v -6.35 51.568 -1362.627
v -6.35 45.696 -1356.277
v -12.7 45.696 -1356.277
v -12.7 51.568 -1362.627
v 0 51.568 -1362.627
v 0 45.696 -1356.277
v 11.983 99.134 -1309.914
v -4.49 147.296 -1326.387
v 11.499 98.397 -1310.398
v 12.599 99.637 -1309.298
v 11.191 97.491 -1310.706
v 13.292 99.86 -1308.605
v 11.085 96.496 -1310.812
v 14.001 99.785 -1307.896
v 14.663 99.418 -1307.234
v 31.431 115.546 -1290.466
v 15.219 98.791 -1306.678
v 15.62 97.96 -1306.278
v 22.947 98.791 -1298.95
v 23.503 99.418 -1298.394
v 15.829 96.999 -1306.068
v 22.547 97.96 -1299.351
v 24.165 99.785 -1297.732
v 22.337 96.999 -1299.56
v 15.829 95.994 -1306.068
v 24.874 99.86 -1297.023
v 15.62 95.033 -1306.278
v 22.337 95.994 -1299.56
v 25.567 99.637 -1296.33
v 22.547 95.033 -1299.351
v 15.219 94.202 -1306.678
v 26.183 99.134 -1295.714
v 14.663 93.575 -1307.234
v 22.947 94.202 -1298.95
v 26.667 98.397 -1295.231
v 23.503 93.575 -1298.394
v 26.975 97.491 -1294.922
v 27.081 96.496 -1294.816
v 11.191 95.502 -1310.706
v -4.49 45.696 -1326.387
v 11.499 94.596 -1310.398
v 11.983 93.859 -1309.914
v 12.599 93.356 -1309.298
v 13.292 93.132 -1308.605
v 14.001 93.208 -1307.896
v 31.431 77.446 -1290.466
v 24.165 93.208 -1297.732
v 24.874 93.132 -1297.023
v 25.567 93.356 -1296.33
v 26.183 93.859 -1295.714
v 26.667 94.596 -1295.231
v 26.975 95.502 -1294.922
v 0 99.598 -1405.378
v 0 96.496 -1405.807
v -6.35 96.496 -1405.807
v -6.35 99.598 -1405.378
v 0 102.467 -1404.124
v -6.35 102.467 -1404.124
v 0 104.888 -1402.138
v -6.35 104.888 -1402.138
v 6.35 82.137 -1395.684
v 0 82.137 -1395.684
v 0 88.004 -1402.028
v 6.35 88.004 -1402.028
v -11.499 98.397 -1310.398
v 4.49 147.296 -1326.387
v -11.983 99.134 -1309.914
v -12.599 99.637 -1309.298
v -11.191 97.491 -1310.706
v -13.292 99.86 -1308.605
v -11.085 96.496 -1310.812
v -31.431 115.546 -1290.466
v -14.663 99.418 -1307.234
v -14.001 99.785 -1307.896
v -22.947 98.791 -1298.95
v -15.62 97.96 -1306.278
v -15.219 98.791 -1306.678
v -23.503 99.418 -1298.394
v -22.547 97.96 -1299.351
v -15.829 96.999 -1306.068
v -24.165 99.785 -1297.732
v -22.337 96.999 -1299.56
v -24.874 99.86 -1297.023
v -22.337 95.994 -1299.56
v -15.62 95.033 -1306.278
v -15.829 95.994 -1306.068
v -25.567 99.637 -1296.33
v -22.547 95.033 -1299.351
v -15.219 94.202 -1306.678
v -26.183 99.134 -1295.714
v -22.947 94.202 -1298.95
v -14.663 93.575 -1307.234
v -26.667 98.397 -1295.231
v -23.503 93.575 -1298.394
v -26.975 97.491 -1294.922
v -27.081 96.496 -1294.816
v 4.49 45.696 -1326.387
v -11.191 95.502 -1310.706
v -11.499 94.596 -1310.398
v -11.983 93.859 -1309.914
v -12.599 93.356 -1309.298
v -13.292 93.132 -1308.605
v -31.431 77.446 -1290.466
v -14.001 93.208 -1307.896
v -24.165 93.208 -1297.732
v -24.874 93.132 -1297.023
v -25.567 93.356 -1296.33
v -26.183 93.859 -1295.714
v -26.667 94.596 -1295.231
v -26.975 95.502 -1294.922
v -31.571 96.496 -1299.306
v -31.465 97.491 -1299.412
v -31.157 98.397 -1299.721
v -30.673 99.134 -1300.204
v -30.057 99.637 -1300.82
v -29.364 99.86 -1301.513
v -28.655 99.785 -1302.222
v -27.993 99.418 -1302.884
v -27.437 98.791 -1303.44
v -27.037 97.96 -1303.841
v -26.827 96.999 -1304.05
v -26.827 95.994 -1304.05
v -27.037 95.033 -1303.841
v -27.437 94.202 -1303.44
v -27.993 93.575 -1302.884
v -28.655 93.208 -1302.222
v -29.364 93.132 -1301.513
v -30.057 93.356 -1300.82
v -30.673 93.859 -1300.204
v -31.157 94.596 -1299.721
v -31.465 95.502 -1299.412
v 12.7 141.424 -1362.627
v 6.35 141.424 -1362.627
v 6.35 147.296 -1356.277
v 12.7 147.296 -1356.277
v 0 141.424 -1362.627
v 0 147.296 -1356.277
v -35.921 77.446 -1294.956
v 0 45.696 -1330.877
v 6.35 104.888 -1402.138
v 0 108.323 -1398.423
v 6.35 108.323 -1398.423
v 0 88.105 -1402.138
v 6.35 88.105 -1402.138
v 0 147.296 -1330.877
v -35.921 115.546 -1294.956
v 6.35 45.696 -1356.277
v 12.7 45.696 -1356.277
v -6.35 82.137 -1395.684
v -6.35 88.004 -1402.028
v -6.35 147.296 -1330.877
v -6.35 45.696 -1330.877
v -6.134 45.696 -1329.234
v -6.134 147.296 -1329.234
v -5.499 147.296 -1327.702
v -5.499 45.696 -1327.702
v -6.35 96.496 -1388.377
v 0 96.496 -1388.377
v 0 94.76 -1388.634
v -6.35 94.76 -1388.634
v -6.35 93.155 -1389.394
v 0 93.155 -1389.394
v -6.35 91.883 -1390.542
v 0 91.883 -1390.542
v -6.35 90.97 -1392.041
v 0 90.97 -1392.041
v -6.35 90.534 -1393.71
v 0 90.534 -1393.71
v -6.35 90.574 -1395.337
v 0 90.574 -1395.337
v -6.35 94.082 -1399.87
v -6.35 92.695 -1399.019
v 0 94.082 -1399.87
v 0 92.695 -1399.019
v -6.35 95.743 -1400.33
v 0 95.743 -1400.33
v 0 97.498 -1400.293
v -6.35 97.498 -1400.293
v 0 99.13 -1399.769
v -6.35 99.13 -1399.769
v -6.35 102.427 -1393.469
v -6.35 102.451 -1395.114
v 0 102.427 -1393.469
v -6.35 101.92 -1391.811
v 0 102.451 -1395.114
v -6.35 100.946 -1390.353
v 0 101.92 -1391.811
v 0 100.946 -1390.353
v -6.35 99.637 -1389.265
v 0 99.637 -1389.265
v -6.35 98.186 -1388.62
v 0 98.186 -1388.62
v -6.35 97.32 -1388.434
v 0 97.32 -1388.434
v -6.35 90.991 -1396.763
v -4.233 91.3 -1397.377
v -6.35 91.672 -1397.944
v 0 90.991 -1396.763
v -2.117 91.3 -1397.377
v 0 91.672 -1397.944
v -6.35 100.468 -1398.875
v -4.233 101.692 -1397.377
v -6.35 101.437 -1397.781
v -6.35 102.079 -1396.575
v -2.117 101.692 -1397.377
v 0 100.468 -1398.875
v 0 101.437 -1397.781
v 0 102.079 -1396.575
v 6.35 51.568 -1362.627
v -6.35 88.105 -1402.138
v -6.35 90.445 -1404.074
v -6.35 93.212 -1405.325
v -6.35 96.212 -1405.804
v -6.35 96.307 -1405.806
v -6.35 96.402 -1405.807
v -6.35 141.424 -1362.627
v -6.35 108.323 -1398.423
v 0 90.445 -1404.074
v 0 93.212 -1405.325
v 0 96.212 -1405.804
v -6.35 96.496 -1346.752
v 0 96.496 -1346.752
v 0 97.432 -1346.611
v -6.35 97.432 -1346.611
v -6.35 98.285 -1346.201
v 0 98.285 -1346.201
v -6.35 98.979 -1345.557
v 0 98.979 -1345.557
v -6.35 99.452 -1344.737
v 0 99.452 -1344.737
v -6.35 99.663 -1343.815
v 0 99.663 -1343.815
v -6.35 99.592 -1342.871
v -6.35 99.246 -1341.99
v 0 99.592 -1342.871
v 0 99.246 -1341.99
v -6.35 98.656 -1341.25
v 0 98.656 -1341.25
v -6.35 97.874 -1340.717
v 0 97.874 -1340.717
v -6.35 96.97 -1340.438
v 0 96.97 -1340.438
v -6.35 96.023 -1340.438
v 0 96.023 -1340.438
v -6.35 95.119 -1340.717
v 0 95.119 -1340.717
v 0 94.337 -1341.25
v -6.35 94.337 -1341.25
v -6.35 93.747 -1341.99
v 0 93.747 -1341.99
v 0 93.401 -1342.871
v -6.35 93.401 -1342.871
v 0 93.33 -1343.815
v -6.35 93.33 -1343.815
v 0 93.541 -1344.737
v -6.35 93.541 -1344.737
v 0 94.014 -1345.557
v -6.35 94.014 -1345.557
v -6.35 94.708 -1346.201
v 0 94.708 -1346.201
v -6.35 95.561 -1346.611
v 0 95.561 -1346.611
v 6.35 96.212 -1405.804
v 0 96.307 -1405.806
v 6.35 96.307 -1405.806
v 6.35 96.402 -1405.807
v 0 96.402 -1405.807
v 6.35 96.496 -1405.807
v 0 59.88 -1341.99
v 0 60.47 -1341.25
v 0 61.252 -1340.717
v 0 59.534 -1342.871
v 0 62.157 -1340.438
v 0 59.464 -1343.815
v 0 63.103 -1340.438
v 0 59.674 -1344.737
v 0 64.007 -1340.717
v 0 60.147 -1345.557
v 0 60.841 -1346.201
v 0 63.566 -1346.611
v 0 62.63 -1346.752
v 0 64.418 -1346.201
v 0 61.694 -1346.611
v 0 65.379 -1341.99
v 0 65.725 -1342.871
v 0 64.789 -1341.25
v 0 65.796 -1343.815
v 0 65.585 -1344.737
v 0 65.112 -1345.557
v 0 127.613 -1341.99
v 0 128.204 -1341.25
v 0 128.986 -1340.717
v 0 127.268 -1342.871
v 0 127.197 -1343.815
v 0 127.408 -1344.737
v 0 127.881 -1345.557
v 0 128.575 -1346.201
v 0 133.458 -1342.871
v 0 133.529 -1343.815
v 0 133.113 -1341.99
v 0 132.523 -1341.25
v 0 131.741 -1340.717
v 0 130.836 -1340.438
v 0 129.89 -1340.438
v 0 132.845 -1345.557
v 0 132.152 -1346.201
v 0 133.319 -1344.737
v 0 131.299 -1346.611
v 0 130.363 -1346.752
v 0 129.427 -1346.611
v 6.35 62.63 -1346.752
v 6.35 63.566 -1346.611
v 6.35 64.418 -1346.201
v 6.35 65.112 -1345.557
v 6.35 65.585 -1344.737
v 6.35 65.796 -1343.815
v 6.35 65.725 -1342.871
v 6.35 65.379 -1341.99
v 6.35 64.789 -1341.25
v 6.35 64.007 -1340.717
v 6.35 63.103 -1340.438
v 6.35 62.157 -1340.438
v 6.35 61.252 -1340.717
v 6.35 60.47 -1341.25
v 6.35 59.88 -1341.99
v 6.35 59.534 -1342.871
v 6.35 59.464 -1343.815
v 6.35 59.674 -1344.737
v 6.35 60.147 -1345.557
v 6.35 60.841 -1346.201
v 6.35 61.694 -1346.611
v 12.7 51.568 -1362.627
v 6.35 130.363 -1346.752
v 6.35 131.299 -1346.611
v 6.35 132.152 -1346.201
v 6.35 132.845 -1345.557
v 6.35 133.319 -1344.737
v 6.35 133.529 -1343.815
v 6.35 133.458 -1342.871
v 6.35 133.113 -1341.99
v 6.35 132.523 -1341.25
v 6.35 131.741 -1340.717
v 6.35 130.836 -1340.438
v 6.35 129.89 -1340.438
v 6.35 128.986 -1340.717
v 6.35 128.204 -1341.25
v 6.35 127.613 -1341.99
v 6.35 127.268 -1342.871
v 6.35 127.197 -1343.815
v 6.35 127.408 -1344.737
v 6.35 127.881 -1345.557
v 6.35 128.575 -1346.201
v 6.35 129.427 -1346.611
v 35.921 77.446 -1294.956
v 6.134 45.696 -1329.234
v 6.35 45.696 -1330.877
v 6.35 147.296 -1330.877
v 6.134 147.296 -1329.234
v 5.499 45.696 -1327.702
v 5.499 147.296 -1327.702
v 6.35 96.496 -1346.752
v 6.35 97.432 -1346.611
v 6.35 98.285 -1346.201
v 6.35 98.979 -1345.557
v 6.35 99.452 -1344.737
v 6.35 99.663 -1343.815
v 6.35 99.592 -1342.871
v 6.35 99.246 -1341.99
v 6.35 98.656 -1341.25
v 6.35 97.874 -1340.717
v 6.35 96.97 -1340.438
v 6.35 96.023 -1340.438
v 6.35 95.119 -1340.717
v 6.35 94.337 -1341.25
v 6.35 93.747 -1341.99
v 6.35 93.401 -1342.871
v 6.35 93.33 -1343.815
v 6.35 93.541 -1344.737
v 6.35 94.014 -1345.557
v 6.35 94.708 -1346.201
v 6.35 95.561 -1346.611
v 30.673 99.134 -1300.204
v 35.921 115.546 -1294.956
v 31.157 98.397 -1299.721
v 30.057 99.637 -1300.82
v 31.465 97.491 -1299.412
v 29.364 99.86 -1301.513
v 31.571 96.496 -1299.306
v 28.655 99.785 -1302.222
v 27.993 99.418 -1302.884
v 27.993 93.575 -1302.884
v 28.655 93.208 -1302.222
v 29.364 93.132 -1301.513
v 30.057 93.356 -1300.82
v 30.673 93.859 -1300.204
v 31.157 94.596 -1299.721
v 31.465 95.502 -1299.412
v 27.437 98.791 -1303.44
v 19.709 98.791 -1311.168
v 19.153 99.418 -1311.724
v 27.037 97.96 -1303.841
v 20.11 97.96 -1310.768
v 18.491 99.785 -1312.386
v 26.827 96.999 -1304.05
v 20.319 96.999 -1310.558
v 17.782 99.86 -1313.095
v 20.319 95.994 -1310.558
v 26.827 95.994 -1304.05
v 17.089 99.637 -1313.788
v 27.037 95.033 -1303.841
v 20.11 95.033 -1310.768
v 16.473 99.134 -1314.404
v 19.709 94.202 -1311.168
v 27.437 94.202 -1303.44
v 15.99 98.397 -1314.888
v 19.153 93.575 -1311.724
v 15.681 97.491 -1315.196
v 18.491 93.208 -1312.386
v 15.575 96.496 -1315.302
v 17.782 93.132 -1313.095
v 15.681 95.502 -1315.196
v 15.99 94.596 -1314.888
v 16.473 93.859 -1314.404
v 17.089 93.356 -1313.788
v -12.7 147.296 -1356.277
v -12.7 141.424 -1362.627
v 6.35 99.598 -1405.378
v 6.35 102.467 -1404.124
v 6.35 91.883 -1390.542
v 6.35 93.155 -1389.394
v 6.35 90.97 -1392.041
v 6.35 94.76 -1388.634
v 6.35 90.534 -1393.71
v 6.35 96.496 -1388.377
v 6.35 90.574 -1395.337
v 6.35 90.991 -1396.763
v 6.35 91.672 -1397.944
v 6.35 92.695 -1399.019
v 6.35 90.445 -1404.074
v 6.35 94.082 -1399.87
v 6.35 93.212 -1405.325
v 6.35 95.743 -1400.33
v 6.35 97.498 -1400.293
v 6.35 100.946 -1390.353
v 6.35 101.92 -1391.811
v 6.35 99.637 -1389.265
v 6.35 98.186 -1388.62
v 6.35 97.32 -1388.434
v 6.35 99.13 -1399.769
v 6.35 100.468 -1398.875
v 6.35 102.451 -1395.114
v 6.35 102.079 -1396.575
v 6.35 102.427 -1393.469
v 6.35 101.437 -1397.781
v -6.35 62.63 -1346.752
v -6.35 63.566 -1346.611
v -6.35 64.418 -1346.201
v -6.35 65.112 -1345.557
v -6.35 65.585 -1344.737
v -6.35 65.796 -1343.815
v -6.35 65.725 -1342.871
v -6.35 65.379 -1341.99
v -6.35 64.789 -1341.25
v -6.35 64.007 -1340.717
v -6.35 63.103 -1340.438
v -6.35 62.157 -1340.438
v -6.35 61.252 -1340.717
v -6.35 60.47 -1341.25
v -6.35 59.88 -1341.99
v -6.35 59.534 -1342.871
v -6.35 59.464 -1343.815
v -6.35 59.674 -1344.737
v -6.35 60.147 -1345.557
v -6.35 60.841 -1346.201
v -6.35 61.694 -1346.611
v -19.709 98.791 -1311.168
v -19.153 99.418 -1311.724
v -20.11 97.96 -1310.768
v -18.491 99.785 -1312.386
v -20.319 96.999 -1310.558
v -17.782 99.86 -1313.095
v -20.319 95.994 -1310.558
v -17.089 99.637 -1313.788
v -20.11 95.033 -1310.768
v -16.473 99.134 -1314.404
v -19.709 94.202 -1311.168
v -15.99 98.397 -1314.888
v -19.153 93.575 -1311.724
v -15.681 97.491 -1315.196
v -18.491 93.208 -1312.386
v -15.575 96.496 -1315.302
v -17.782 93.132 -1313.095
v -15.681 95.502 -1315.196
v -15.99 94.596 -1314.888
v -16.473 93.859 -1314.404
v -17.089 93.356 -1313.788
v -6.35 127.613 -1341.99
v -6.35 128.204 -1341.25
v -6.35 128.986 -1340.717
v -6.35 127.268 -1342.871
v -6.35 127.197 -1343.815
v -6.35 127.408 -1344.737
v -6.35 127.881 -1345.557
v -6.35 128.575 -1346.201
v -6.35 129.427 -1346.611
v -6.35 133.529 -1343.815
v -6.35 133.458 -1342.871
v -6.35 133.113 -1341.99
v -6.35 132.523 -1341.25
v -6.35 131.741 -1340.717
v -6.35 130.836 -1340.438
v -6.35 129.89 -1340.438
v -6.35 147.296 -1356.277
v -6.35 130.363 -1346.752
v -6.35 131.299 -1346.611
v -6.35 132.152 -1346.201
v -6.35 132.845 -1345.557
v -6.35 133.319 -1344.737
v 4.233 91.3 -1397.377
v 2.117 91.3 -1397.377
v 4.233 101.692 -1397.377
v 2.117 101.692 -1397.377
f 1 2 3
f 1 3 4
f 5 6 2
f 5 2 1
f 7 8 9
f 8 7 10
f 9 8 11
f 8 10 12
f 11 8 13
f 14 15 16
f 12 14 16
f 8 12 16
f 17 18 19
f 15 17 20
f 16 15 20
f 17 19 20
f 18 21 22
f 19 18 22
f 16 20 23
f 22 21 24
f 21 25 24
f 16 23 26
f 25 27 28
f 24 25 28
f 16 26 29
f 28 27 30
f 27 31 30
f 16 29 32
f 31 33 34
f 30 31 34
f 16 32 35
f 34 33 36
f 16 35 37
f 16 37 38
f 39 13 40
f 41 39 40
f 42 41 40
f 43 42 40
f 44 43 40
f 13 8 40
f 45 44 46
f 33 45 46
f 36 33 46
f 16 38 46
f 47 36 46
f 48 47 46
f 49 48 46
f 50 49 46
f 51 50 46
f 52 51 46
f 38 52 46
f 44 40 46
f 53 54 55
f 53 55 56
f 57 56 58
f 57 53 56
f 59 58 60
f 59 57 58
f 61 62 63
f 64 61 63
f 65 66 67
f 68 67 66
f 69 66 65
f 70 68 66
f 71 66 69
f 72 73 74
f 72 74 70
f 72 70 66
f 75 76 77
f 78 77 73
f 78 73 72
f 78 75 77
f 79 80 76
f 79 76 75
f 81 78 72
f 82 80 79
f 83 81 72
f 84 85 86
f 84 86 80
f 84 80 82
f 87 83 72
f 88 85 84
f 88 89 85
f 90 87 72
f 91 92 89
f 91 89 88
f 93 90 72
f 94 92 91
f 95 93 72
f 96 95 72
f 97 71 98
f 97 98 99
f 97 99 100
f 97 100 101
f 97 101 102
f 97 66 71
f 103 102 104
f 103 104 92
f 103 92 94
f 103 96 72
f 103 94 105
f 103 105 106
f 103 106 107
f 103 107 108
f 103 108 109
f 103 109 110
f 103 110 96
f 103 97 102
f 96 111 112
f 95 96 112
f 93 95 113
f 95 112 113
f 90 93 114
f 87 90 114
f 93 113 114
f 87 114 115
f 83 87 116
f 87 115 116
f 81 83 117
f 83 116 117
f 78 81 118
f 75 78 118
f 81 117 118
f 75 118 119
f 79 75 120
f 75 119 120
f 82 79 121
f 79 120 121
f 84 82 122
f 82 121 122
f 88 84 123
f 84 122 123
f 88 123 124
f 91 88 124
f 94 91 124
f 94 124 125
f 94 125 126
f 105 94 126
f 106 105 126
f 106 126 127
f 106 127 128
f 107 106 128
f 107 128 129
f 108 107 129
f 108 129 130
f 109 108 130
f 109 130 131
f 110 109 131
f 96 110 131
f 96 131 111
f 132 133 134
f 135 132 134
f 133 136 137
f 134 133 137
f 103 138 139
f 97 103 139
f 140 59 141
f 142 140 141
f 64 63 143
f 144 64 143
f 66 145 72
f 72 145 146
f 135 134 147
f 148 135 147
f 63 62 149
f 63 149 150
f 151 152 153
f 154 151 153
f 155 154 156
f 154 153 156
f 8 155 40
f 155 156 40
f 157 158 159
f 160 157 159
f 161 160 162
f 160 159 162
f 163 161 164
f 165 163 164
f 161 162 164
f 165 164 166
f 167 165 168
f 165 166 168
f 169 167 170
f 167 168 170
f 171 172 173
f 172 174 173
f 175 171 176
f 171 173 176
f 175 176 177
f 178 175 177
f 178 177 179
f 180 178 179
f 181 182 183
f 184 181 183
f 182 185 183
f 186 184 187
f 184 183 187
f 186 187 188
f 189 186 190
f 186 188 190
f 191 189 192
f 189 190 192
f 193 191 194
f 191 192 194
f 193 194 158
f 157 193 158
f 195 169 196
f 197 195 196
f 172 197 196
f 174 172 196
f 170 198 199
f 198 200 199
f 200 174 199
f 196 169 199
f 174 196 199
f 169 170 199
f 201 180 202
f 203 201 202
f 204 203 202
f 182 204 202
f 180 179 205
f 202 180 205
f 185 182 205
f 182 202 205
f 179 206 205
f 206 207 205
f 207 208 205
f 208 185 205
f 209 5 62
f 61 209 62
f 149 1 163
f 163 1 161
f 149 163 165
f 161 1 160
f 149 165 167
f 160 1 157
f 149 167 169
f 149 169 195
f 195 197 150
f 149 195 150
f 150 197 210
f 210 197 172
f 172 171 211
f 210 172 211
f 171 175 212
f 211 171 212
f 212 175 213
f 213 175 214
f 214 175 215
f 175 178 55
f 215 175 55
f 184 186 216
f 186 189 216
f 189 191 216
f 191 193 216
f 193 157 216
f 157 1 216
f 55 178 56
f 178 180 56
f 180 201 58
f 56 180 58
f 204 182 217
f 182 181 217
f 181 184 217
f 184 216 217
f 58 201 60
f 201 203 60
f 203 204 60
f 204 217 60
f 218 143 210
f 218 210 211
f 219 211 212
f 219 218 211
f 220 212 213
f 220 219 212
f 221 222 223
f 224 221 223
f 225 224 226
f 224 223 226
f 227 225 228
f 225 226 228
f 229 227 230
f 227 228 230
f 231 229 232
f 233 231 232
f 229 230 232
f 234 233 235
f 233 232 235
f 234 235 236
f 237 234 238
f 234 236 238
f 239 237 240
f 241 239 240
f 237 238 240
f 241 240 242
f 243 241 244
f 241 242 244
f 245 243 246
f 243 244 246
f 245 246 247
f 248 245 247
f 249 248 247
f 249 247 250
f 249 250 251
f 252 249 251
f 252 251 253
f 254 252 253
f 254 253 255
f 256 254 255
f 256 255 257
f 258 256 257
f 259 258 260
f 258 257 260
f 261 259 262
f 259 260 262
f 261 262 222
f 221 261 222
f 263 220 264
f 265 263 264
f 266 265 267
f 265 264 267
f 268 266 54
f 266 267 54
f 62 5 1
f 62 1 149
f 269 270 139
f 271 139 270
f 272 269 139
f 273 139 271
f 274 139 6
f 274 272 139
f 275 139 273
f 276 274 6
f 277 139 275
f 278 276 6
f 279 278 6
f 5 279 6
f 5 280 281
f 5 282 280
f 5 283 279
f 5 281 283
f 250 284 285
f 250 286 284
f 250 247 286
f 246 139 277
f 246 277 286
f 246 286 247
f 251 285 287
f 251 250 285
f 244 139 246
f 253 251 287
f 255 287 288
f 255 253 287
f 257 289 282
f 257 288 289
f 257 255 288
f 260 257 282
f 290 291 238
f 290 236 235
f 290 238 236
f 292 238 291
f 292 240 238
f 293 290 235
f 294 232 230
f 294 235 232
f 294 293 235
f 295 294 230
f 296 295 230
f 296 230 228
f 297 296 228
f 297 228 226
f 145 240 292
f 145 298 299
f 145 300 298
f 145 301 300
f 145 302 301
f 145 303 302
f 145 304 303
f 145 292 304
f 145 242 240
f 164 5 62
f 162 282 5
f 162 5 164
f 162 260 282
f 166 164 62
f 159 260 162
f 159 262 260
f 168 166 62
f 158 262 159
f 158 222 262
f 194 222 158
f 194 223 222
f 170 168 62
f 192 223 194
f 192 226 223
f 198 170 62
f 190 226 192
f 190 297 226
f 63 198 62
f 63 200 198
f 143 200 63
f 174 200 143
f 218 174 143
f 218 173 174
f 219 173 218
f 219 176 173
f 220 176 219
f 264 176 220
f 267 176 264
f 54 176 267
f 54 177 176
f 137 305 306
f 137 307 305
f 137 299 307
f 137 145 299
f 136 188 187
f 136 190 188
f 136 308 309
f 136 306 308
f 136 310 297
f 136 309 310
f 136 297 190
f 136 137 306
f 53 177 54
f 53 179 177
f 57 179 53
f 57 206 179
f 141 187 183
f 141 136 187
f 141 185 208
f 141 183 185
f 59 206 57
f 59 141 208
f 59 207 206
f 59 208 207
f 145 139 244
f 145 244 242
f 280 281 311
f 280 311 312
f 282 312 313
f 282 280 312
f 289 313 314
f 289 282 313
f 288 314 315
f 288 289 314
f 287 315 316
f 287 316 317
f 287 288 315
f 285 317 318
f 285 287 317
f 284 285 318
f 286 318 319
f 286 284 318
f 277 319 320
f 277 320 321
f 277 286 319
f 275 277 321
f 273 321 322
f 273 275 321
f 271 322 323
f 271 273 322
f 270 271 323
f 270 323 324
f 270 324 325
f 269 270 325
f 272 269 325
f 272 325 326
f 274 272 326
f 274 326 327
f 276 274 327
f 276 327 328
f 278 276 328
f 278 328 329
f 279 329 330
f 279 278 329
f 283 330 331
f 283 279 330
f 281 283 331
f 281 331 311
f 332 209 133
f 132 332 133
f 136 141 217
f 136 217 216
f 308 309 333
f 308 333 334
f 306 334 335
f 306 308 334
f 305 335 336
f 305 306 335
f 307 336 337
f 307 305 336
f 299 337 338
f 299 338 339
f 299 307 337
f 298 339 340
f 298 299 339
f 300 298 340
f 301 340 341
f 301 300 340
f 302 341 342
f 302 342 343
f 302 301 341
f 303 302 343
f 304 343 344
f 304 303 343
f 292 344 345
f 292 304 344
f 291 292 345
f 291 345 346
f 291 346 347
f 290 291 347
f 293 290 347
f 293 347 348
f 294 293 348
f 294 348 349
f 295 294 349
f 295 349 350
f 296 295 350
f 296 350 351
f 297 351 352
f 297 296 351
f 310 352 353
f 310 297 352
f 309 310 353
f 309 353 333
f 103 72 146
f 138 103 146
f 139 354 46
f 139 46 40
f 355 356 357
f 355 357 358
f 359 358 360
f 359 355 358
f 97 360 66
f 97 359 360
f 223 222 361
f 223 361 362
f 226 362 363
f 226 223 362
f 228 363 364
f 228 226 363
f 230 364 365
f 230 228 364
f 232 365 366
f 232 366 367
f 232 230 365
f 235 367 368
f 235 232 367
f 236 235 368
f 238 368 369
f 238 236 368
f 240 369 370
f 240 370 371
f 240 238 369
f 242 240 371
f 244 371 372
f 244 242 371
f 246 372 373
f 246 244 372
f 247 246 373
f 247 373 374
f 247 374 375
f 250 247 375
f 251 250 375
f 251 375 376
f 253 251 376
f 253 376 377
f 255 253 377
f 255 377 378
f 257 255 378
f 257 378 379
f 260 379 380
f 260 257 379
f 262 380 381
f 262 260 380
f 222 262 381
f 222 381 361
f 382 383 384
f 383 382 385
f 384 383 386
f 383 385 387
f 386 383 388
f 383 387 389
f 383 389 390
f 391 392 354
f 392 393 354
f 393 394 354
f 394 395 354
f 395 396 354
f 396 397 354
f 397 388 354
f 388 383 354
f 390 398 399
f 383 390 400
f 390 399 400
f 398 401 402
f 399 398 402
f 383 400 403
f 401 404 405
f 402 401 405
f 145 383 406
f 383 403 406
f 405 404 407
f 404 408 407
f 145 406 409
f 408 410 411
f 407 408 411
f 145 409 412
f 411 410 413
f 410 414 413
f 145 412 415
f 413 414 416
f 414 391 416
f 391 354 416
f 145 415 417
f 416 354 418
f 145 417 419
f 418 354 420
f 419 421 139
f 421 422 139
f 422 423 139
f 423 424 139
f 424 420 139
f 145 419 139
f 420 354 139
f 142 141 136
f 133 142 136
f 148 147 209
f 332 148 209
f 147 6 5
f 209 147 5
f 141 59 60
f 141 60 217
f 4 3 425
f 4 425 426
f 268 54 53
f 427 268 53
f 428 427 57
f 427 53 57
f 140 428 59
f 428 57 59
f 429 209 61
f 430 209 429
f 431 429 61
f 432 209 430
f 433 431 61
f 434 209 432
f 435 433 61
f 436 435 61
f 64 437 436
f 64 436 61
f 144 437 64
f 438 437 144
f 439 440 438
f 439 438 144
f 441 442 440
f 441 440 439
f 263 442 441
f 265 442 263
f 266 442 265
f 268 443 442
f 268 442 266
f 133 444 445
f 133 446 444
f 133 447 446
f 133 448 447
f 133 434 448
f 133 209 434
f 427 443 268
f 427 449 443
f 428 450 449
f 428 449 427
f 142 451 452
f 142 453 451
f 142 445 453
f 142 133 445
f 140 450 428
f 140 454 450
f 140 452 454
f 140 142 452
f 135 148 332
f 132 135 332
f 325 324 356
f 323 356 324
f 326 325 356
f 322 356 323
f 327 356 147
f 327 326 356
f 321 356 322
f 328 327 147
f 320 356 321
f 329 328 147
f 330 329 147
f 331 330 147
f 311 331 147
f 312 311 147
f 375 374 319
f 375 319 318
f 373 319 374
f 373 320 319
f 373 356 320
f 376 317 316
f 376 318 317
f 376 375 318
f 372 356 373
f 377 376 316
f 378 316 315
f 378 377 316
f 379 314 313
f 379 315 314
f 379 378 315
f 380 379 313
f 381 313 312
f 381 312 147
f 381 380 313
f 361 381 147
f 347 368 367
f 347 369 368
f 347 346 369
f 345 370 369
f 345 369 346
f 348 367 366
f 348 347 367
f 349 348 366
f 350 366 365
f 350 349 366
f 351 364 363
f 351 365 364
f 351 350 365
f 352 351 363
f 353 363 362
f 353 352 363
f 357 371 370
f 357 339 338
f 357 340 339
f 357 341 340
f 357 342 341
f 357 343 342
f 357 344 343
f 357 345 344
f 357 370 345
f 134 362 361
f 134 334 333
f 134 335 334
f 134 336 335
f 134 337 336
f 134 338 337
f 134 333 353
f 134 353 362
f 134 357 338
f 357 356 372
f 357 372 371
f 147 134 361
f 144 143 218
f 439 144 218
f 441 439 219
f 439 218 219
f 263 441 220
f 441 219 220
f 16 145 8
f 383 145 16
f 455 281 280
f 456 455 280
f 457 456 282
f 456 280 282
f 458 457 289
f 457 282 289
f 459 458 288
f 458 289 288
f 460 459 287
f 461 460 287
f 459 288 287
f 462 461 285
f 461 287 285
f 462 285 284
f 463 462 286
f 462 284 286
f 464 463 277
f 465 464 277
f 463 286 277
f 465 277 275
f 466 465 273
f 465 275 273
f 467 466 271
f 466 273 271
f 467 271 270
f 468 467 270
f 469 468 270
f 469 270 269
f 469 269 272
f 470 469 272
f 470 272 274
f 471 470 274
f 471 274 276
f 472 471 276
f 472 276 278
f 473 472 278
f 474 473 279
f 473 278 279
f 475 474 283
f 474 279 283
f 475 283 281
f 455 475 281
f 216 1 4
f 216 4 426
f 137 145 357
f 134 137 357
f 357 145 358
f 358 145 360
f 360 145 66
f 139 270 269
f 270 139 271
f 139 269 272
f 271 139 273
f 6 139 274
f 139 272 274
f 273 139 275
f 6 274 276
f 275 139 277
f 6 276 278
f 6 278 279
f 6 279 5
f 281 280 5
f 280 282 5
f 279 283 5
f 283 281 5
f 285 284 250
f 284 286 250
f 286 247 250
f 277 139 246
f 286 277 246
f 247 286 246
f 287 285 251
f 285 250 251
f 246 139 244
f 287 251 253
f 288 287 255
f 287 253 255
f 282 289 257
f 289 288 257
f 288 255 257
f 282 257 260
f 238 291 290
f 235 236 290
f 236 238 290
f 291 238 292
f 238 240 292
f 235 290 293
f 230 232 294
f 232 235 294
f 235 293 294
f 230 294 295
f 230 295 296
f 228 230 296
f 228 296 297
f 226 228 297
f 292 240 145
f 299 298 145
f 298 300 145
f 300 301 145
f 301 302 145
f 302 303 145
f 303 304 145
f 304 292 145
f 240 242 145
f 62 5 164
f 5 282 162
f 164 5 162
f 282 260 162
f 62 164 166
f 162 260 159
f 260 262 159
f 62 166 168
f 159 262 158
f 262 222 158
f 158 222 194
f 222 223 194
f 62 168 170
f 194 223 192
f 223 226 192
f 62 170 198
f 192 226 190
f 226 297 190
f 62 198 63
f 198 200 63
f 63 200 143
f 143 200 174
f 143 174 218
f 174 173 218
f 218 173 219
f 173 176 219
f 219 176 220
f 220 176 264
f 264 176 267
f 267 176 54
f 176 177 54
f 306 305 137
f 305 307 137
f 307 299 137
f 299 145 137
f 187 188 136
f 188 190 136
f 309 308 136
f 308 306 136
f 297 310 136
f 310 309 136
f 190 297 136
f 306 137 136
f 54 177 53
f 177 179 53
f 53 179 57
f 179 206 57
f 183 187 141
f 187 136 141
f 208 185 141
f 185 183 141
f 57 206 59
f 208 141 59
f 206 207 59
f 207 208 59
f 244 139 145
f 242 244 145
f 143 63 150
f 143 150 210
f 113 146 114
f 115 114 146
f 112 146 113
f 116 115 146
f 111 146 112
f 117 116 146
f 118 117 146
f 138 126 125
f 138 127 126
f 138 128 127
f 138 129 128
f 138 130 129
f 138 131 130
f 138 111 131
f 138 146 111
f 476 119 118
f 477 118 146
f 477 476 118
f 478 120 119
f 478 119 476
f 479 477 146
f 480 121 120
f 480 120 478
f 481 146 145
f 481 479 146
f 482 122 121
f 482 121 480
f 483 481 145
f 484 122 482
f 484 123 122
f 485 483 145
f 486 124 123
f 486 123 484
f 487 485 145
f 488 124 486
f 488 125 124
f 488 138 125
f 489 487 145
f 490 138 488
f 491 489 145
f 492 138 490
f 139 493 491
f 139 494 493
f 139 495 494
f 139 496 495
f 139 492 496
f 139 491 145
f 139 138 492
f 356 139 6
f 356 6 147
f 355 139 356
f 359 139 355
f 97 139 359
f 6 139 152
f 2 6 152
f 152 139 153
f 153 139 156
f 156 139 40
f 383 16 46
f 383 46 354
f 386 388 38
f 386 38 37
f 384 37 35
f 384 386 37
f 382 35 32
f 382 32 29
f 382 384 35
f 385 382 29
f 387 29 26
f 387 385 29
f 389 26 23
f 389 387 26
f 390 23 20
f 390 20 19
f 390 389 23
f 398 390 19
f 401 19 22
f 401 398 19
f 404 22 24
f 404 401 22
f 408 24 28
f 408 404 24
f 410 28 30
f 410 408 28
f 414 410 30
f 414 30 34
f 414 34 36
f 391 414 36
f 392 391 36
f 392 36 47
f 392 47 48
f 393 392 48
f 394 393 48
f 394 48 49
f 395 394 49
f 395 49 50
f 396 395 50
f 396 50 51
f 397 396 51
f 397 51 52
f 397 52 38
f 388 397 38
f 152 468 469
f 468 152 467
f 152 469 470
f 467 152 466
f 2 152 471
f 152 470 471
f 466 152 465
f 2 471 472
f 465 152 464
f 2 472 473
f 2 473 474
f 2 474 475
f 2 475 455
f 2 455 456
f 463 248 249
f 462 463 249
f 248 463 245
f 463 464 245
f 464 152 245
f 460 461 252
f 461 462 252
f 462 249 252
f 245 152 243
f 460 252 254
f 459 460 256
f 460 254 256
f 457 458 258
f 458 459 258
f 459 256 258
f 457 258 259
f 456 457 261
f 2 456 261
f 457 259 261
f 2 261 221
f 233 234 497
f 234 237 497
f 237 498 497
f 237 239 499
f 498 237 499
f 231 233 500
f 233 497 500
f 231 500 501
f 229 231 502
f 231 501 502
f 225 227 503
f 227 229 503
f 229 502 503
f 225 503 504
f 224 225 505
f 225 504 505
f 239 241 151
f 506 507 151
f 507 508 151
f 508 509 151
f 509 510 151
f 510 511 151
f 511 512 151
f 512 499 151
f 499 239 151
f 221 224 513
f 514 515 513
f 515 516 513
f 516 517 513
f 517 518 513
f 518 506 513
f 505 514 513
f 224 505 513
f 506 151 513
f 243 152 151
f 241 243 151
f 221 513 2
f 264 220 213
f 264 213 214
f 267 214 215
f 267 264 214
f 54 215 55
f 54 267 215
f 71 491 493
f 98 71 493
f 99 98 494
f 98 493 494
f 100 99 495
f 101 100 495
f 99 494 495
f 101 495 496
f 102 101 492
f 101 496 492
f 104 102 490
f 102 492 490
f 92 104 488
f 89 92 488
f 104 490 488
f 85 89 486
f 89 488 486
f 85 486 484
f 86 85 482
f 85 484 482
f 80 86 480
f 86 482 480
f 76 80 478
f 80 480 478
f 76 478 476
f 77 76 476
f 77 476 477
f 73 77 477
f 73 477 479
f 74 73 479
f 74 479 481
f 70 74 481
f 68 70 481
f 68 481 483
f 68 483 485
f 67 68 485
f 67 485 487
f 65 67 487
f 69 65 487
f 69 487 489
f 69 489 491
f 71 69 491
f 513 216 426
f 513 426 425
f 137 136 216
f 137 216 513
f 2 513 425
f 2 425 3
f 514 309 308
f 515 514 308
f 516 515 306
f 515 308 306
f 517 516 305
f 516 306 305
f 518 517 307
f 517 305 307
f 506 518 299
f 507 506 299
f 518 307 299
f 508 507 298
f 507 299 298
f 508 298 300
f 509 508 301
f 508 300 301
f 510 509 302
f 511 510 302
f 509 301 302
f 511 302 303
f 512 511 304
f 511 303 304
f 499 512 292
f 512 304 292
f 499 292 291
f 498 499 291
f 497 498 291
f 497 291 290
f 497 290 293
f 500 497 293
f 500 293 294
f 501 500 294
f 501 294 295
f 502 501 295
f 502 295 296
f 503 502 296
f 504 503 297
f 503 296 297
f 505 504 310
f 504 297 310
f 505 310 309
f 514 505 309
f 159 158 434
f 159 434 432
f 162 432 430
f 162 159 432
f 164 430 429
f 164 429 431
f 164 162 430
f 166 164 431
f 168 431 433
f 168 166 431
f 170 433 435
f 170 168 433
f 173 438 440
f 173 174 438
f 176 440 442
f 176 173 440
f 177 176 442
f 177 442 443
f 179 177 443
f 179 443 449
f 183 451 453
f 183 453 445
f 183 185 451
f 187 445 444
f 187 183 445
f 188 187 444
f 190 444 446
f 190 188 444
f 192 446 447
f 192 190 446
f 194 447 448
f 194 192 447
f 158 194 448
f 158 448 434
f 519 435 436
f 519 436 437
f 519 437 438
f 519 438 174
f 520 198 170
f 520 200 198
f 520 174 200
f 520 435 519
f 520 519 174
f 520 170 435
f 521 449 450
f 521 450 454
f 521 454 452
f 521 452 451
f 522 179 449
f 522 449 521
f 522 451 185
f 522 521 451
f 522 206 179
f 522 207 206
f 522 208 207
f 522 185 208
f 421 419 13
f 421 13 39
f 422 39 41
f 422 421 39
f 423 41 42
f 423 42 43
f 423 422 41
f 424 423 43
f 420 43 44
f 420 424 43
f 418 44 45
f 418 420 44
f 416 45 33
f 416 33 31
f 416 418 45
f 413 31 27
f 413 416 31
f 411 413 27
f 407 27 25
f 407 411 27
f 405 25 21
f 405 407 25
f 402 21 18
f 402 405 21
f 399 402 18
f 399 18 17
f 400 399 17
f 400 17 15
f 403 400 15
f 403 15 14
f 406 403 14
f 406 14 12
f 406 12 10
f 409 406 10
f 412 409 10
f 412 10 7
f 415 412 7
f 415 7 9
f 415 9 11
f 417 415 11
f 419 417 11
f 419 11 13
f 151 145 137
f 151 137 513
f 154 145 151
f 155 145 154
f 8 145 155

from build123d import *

# Parameters (mm, degrees)
SKETCH1_W           = 25.4
SKETCH1_H           = 101.6
SKETCH1_R           = 3.175
BOSS_EXTRUDE1_DEPTH = 6.35
BOSS_EXTRUDE2_DEPTH = 12.7
BOSS_EXTRUDE3_DEPTH = 101.6
CUT_EXTRUDE1_DEPTH  = 1015.748334056
CUT_EXTRUDE4_DEPTH  = 1015.748334056


with BuildPart() as part:
    # Sketch1 → Boss-Extrude1 (new body)
    # profile 1 of 7: a face of its own
    with BuildSketch(Plane(origin=(0, 0, 0), x_dir=(0, 0, -1), z_dir=(1, 0, 0))):
        with BuildLine():
            Line((1398.423242973, 108.323129495), (1362.627423264, 141.42442982))
            Line((1362.627423264, 141.42442982), (1362.627423264, 51.568441203))
            Line((1362.627423264, 51.568441203), (1395.68444407, 82.137104875))
            Line((1395.68444407, 82.137104875), (1389.154234775, 85.14044675))
            add(Edge.make_bspline(
                [(1398.423242973, 108.323129495), (1387.739315105, 111.977739505), (1383.021002085, 101.719425118), (1377.797813595, 90.363436356), (1389.154234775, 85.14044675)],
                knots=[1.250204036, 1.250204036, 1.250204036, 2.710509531, 2.710509531, 4.281305858, 4.281305858, 4.281305858], degree=2, weights=[0.96169376, 0.72770908, 1, 0.707106781, 1]))
        make_face()
    # profile 2 of 7: a face of its own
    with BuildSketch(Plane(origin=(0, 0, 0), x_dir=(0, 0, -1), z_dir=(1, 0, 0))):
        with BuildLine():
            Line((1402.137630748, 104.888341124), (1398.423242973, 108.323129495))
            add(Edge.make_bspline(
                [(1398.423242973, 108.323129495), (1387.739315105, 111.977739505), (1383.021002085, 101.719425118), (1377.797813595, 90.363436356), (1389.154234775, 85.14044675)],
                knots=[1.250204036, 1.250204036, 1.250204036, 2.710509531, 2.710509531, 4.281305858, 4.281305858, 4.281305858], degree=2, weights=[0.96169376, 0.72770908, 1, 0.707106781, 1]))
            Line((1389.154234775, 85.14044675), (1395.68444407, 82.137104875))
            Line((1395.68444407, 82.137104875), (1402.028477486, 88.003593115))
            Line((1402.028477486, 88.003593115), (1402.029499743, 88.005815653))
            ThreePointArc((1402.029499743, 88.005815653), (1382.947657703, 96.569642096), (1402.137630748, 104.888341124))
        make_face()
    # profile 3 of 7: a face of its own
    with BuildSketch(Plane(origin=(0, 0, 0), x_dir=(0, 0, -1), z_dir=(1, 0, 0))):
        with BuildLine():
            ThreePointArc((1405.807423264, 96.496435511), (1404.849864993, 101.076049494), (1402.137630748, 104.888341124))
            ThreePointArc((1402.137630748, 104.888341124), (1382.947657703, 96.569642096), (1402.029499743, 88.005815653))
            Line((1402.029499743, 88.005815653), (1405.803880671, 96.211881257))
            ThreePointArc((1405.803880671, 96.211881257), (1405.806537582, 96.354147359), (1405.807423264, 96.496435511))
        make_face()
        with BuildLine():
            add(Edge.make_bspline(
                [(1388.377423264, 96.496435511), (1388.377423264, 86.104526373), (1397.377423264, 91.300480942), (1406.377423264, 96.496435511), (1397.377423264, 101.69239008), (1388.377423264, 106.888344649), (1388.377423264, 96.496435511)],
                knots=[0, 0, 0, 2.094395102, 2.094395102, 4.188790205, 4.188790205, 6.283185307, 6.283185307, 6.283185307], degree=2, weights=[1, 0.5, 1, 0.5, 1, 0.5, 1]))
        make_face(mode=Mode.SUBTRACT)
    # profile 4 of 7: a face of its own
    with BuildSketch(Plane(origin=(0, 0, 0), x_dir=(0, 0, -1), z_dir=(1, 0, 0))):
        with BuildLine():
            Line((1405.803880671, 96.211881257), (1402.029499743, 88.005815653))
            ThreePointArc((1402.029499743, 88.005815653), (1402.083723308, 88.054999635), (1402.137630748, 88.104529898))
            ThreePointArc((1402.137630748, 88.104529898), (1404.792043465, 91.786808554), (1405.803880671, 96.211881257))
        make_face()
    # profile 5 of 7: a face of its own
    with BuildSketch(Plane(origin=(0, 0, 0), x_dir=(0, 0, -1), z_dir=(1, 0, 0))):
        with BuildLine():
            ThreePointArc((1402.137630748, 88.104529898), (1402.083723308, 88.054999635), (1402.029499743, 88.005815653))
            Line((1402.029499743, 88.005815653), (1402.028477486, 88.003593115))
            Line((1402.028477486, 88.003593115), (1402.137630748, 88.104529898))
        make_face()
    # profile 6 of 7: a face of its own
    with BuildSketch(Plane(origin=(0, 0, 0), x_dir=(0, 0, -1), z_dir=(1, 0, 0))):
        Polygon((1362.627423264, 51.568441203), (1362.627423264, 141.42442982), (1356.277423264, 147.296435511), (1356.277423264, 45.696435511), align=None)
    # profile 7 of 7: a face of its own
    with BuildSketch(Plane(origin=(0, 0, 0), x_dir=(0, 0, -1), z_dir=(1, 0, 0))):
        with Locations((1343.577423264, 96.496435511)):
            Rectangle(SKETCH1_W, SKETCH1_H)
        with Locations((1343.577423264, 96.496435511)):
            Circle(SKETCH1_R, mode=Mode.SUBTRACT)
        with Locations((1343.577423264, 130.363102178)):
            Circle(SKETCH1_R, mode=Mode.SUBTRACT)
        with Locations((1343.577423264, 62.629768844)):
            Circle(SKETCH1_R, mode=Mode.SUBTRACT)
    extrude(amount=BOSS_EXTRUDE1_DEPTH)

    # Sketch1<4> → Boss-Extrude2 (add)
    with BuildSketch(Plane(origin=(0, 0, 0), x_dir=(0, 0, -1), z_dir=(1, 0, 0))):
        Polygon((1362.627423264, 51.568441203), (1362.627423264, 141.42442982), (1356.277423264, 147.296435511), (1356.277423264, 45.696435511), align=None)
    extrude(amount=BOSS_EXTRUDE2_DEPTH)

    # Sketch2 → Boss-Extrude3 (add)
    with BuildSketch(Plane.XZ.offset(-45.696435511)):
        with BuildLine():
            Line((-35.921024484, -1294.95639878), (0, -1330.877423264))
            Line((0, -1330.877423264), (6.35, -1330.877423264))
            ThreePointArc((6.35, -1330.877423264), (5.866635031, -1328.447383469), (4.490128061, -1326.387295204))
            Line((4.490128061, -1326.387295204), (-31.430896424, -1290.46627072))
            Line((-31.430896424, -1290.46627072), (-35.921024484, -1294.95639878))
        make_face()
    extrude(amount=-BOSS_EXTRUDE3_DEPTH)

    # Sketch3 → Cut-Extrude1 (cut, through all)
    with BuildSketch(Plane(origin=(-665.438711632, 0, -665.438711632), x_dir=(-0.7071067811865446, 0, 0.7071067811865505), z_dir=(-0.7071067811865505, 0, -0.7071067811865446))):
        Polygon((-890.272450918, 147.296435511), (-941.072450918, 147.296435511), (-890.272450918, 115.546435511), align=None)
        Polygon((-890.272450918, 45.696435511), (-890.272450918, 77.446435511), (-941.072450918, 45.696435511), align=None)
    extrude(amount=-CUT_EXTRUDE1_DEPTH, mode=Mode.SUBTRACT)

    # Sketch7 → Cut-Extrude4 (cut, through all)
    with BuildSketch(Plane(origin=(-665.438711632, 0, -665.438711632), x_dir=(-0.7071067811865439, 0, 0.7071067811865511), z_dir=(-0.7071067811865511, 0, -0.7071067811865439))):
        with BuildLine():
            ThreePointArc((-912.299013418, 96.496435511), (-915.672450918, 99.869873011), (-919.045888418, 96.496435511))
            Line((-919.045888418, 96.496435511), (-912.299013418, 96.496435511))
        make_face()
        with BuildLine():
            Line((-912.299013418, 96.496435511), (-919.045888418, 96.496435511))
            ThreePointArc((-919.045888418, 96.496435511), (-915.672450918, 93.122998011), (-912.299013418, 96.496435511))
        make_face()
        with BuildLine():
            ThreePointArc((-903.170888418, 96.496435511), (-899.797450918, 93.122998011), (-896.424013418, 96.496435511))
            Line((-896.424013418, 96.496435511), (-903.170888418, 96.496435511))
        make_face()
        with BuildLine():
            Line((-903.170888418, 96.496435511), (-896.424013418, 96.496435511))
            ThreePointArc((-896.424013418, 96.496435511), (-899.797450918, 99.869873011), (-903.170888418, 96.496435511))
        make_face()
    extrude(amount=-CUT_EXTRUDE4_DEPTH, mode=Mode.SUBTRACT)


with BuildPart() as body_2:
    # Mirror1: mirrored copy
    add(part.part.mirror(Plane(origin=(0, 0, 0), x_dir=(0, 0, 1), z_dir=(1, 0, 0))))


solid = Compound([part.part, body_2.part])
